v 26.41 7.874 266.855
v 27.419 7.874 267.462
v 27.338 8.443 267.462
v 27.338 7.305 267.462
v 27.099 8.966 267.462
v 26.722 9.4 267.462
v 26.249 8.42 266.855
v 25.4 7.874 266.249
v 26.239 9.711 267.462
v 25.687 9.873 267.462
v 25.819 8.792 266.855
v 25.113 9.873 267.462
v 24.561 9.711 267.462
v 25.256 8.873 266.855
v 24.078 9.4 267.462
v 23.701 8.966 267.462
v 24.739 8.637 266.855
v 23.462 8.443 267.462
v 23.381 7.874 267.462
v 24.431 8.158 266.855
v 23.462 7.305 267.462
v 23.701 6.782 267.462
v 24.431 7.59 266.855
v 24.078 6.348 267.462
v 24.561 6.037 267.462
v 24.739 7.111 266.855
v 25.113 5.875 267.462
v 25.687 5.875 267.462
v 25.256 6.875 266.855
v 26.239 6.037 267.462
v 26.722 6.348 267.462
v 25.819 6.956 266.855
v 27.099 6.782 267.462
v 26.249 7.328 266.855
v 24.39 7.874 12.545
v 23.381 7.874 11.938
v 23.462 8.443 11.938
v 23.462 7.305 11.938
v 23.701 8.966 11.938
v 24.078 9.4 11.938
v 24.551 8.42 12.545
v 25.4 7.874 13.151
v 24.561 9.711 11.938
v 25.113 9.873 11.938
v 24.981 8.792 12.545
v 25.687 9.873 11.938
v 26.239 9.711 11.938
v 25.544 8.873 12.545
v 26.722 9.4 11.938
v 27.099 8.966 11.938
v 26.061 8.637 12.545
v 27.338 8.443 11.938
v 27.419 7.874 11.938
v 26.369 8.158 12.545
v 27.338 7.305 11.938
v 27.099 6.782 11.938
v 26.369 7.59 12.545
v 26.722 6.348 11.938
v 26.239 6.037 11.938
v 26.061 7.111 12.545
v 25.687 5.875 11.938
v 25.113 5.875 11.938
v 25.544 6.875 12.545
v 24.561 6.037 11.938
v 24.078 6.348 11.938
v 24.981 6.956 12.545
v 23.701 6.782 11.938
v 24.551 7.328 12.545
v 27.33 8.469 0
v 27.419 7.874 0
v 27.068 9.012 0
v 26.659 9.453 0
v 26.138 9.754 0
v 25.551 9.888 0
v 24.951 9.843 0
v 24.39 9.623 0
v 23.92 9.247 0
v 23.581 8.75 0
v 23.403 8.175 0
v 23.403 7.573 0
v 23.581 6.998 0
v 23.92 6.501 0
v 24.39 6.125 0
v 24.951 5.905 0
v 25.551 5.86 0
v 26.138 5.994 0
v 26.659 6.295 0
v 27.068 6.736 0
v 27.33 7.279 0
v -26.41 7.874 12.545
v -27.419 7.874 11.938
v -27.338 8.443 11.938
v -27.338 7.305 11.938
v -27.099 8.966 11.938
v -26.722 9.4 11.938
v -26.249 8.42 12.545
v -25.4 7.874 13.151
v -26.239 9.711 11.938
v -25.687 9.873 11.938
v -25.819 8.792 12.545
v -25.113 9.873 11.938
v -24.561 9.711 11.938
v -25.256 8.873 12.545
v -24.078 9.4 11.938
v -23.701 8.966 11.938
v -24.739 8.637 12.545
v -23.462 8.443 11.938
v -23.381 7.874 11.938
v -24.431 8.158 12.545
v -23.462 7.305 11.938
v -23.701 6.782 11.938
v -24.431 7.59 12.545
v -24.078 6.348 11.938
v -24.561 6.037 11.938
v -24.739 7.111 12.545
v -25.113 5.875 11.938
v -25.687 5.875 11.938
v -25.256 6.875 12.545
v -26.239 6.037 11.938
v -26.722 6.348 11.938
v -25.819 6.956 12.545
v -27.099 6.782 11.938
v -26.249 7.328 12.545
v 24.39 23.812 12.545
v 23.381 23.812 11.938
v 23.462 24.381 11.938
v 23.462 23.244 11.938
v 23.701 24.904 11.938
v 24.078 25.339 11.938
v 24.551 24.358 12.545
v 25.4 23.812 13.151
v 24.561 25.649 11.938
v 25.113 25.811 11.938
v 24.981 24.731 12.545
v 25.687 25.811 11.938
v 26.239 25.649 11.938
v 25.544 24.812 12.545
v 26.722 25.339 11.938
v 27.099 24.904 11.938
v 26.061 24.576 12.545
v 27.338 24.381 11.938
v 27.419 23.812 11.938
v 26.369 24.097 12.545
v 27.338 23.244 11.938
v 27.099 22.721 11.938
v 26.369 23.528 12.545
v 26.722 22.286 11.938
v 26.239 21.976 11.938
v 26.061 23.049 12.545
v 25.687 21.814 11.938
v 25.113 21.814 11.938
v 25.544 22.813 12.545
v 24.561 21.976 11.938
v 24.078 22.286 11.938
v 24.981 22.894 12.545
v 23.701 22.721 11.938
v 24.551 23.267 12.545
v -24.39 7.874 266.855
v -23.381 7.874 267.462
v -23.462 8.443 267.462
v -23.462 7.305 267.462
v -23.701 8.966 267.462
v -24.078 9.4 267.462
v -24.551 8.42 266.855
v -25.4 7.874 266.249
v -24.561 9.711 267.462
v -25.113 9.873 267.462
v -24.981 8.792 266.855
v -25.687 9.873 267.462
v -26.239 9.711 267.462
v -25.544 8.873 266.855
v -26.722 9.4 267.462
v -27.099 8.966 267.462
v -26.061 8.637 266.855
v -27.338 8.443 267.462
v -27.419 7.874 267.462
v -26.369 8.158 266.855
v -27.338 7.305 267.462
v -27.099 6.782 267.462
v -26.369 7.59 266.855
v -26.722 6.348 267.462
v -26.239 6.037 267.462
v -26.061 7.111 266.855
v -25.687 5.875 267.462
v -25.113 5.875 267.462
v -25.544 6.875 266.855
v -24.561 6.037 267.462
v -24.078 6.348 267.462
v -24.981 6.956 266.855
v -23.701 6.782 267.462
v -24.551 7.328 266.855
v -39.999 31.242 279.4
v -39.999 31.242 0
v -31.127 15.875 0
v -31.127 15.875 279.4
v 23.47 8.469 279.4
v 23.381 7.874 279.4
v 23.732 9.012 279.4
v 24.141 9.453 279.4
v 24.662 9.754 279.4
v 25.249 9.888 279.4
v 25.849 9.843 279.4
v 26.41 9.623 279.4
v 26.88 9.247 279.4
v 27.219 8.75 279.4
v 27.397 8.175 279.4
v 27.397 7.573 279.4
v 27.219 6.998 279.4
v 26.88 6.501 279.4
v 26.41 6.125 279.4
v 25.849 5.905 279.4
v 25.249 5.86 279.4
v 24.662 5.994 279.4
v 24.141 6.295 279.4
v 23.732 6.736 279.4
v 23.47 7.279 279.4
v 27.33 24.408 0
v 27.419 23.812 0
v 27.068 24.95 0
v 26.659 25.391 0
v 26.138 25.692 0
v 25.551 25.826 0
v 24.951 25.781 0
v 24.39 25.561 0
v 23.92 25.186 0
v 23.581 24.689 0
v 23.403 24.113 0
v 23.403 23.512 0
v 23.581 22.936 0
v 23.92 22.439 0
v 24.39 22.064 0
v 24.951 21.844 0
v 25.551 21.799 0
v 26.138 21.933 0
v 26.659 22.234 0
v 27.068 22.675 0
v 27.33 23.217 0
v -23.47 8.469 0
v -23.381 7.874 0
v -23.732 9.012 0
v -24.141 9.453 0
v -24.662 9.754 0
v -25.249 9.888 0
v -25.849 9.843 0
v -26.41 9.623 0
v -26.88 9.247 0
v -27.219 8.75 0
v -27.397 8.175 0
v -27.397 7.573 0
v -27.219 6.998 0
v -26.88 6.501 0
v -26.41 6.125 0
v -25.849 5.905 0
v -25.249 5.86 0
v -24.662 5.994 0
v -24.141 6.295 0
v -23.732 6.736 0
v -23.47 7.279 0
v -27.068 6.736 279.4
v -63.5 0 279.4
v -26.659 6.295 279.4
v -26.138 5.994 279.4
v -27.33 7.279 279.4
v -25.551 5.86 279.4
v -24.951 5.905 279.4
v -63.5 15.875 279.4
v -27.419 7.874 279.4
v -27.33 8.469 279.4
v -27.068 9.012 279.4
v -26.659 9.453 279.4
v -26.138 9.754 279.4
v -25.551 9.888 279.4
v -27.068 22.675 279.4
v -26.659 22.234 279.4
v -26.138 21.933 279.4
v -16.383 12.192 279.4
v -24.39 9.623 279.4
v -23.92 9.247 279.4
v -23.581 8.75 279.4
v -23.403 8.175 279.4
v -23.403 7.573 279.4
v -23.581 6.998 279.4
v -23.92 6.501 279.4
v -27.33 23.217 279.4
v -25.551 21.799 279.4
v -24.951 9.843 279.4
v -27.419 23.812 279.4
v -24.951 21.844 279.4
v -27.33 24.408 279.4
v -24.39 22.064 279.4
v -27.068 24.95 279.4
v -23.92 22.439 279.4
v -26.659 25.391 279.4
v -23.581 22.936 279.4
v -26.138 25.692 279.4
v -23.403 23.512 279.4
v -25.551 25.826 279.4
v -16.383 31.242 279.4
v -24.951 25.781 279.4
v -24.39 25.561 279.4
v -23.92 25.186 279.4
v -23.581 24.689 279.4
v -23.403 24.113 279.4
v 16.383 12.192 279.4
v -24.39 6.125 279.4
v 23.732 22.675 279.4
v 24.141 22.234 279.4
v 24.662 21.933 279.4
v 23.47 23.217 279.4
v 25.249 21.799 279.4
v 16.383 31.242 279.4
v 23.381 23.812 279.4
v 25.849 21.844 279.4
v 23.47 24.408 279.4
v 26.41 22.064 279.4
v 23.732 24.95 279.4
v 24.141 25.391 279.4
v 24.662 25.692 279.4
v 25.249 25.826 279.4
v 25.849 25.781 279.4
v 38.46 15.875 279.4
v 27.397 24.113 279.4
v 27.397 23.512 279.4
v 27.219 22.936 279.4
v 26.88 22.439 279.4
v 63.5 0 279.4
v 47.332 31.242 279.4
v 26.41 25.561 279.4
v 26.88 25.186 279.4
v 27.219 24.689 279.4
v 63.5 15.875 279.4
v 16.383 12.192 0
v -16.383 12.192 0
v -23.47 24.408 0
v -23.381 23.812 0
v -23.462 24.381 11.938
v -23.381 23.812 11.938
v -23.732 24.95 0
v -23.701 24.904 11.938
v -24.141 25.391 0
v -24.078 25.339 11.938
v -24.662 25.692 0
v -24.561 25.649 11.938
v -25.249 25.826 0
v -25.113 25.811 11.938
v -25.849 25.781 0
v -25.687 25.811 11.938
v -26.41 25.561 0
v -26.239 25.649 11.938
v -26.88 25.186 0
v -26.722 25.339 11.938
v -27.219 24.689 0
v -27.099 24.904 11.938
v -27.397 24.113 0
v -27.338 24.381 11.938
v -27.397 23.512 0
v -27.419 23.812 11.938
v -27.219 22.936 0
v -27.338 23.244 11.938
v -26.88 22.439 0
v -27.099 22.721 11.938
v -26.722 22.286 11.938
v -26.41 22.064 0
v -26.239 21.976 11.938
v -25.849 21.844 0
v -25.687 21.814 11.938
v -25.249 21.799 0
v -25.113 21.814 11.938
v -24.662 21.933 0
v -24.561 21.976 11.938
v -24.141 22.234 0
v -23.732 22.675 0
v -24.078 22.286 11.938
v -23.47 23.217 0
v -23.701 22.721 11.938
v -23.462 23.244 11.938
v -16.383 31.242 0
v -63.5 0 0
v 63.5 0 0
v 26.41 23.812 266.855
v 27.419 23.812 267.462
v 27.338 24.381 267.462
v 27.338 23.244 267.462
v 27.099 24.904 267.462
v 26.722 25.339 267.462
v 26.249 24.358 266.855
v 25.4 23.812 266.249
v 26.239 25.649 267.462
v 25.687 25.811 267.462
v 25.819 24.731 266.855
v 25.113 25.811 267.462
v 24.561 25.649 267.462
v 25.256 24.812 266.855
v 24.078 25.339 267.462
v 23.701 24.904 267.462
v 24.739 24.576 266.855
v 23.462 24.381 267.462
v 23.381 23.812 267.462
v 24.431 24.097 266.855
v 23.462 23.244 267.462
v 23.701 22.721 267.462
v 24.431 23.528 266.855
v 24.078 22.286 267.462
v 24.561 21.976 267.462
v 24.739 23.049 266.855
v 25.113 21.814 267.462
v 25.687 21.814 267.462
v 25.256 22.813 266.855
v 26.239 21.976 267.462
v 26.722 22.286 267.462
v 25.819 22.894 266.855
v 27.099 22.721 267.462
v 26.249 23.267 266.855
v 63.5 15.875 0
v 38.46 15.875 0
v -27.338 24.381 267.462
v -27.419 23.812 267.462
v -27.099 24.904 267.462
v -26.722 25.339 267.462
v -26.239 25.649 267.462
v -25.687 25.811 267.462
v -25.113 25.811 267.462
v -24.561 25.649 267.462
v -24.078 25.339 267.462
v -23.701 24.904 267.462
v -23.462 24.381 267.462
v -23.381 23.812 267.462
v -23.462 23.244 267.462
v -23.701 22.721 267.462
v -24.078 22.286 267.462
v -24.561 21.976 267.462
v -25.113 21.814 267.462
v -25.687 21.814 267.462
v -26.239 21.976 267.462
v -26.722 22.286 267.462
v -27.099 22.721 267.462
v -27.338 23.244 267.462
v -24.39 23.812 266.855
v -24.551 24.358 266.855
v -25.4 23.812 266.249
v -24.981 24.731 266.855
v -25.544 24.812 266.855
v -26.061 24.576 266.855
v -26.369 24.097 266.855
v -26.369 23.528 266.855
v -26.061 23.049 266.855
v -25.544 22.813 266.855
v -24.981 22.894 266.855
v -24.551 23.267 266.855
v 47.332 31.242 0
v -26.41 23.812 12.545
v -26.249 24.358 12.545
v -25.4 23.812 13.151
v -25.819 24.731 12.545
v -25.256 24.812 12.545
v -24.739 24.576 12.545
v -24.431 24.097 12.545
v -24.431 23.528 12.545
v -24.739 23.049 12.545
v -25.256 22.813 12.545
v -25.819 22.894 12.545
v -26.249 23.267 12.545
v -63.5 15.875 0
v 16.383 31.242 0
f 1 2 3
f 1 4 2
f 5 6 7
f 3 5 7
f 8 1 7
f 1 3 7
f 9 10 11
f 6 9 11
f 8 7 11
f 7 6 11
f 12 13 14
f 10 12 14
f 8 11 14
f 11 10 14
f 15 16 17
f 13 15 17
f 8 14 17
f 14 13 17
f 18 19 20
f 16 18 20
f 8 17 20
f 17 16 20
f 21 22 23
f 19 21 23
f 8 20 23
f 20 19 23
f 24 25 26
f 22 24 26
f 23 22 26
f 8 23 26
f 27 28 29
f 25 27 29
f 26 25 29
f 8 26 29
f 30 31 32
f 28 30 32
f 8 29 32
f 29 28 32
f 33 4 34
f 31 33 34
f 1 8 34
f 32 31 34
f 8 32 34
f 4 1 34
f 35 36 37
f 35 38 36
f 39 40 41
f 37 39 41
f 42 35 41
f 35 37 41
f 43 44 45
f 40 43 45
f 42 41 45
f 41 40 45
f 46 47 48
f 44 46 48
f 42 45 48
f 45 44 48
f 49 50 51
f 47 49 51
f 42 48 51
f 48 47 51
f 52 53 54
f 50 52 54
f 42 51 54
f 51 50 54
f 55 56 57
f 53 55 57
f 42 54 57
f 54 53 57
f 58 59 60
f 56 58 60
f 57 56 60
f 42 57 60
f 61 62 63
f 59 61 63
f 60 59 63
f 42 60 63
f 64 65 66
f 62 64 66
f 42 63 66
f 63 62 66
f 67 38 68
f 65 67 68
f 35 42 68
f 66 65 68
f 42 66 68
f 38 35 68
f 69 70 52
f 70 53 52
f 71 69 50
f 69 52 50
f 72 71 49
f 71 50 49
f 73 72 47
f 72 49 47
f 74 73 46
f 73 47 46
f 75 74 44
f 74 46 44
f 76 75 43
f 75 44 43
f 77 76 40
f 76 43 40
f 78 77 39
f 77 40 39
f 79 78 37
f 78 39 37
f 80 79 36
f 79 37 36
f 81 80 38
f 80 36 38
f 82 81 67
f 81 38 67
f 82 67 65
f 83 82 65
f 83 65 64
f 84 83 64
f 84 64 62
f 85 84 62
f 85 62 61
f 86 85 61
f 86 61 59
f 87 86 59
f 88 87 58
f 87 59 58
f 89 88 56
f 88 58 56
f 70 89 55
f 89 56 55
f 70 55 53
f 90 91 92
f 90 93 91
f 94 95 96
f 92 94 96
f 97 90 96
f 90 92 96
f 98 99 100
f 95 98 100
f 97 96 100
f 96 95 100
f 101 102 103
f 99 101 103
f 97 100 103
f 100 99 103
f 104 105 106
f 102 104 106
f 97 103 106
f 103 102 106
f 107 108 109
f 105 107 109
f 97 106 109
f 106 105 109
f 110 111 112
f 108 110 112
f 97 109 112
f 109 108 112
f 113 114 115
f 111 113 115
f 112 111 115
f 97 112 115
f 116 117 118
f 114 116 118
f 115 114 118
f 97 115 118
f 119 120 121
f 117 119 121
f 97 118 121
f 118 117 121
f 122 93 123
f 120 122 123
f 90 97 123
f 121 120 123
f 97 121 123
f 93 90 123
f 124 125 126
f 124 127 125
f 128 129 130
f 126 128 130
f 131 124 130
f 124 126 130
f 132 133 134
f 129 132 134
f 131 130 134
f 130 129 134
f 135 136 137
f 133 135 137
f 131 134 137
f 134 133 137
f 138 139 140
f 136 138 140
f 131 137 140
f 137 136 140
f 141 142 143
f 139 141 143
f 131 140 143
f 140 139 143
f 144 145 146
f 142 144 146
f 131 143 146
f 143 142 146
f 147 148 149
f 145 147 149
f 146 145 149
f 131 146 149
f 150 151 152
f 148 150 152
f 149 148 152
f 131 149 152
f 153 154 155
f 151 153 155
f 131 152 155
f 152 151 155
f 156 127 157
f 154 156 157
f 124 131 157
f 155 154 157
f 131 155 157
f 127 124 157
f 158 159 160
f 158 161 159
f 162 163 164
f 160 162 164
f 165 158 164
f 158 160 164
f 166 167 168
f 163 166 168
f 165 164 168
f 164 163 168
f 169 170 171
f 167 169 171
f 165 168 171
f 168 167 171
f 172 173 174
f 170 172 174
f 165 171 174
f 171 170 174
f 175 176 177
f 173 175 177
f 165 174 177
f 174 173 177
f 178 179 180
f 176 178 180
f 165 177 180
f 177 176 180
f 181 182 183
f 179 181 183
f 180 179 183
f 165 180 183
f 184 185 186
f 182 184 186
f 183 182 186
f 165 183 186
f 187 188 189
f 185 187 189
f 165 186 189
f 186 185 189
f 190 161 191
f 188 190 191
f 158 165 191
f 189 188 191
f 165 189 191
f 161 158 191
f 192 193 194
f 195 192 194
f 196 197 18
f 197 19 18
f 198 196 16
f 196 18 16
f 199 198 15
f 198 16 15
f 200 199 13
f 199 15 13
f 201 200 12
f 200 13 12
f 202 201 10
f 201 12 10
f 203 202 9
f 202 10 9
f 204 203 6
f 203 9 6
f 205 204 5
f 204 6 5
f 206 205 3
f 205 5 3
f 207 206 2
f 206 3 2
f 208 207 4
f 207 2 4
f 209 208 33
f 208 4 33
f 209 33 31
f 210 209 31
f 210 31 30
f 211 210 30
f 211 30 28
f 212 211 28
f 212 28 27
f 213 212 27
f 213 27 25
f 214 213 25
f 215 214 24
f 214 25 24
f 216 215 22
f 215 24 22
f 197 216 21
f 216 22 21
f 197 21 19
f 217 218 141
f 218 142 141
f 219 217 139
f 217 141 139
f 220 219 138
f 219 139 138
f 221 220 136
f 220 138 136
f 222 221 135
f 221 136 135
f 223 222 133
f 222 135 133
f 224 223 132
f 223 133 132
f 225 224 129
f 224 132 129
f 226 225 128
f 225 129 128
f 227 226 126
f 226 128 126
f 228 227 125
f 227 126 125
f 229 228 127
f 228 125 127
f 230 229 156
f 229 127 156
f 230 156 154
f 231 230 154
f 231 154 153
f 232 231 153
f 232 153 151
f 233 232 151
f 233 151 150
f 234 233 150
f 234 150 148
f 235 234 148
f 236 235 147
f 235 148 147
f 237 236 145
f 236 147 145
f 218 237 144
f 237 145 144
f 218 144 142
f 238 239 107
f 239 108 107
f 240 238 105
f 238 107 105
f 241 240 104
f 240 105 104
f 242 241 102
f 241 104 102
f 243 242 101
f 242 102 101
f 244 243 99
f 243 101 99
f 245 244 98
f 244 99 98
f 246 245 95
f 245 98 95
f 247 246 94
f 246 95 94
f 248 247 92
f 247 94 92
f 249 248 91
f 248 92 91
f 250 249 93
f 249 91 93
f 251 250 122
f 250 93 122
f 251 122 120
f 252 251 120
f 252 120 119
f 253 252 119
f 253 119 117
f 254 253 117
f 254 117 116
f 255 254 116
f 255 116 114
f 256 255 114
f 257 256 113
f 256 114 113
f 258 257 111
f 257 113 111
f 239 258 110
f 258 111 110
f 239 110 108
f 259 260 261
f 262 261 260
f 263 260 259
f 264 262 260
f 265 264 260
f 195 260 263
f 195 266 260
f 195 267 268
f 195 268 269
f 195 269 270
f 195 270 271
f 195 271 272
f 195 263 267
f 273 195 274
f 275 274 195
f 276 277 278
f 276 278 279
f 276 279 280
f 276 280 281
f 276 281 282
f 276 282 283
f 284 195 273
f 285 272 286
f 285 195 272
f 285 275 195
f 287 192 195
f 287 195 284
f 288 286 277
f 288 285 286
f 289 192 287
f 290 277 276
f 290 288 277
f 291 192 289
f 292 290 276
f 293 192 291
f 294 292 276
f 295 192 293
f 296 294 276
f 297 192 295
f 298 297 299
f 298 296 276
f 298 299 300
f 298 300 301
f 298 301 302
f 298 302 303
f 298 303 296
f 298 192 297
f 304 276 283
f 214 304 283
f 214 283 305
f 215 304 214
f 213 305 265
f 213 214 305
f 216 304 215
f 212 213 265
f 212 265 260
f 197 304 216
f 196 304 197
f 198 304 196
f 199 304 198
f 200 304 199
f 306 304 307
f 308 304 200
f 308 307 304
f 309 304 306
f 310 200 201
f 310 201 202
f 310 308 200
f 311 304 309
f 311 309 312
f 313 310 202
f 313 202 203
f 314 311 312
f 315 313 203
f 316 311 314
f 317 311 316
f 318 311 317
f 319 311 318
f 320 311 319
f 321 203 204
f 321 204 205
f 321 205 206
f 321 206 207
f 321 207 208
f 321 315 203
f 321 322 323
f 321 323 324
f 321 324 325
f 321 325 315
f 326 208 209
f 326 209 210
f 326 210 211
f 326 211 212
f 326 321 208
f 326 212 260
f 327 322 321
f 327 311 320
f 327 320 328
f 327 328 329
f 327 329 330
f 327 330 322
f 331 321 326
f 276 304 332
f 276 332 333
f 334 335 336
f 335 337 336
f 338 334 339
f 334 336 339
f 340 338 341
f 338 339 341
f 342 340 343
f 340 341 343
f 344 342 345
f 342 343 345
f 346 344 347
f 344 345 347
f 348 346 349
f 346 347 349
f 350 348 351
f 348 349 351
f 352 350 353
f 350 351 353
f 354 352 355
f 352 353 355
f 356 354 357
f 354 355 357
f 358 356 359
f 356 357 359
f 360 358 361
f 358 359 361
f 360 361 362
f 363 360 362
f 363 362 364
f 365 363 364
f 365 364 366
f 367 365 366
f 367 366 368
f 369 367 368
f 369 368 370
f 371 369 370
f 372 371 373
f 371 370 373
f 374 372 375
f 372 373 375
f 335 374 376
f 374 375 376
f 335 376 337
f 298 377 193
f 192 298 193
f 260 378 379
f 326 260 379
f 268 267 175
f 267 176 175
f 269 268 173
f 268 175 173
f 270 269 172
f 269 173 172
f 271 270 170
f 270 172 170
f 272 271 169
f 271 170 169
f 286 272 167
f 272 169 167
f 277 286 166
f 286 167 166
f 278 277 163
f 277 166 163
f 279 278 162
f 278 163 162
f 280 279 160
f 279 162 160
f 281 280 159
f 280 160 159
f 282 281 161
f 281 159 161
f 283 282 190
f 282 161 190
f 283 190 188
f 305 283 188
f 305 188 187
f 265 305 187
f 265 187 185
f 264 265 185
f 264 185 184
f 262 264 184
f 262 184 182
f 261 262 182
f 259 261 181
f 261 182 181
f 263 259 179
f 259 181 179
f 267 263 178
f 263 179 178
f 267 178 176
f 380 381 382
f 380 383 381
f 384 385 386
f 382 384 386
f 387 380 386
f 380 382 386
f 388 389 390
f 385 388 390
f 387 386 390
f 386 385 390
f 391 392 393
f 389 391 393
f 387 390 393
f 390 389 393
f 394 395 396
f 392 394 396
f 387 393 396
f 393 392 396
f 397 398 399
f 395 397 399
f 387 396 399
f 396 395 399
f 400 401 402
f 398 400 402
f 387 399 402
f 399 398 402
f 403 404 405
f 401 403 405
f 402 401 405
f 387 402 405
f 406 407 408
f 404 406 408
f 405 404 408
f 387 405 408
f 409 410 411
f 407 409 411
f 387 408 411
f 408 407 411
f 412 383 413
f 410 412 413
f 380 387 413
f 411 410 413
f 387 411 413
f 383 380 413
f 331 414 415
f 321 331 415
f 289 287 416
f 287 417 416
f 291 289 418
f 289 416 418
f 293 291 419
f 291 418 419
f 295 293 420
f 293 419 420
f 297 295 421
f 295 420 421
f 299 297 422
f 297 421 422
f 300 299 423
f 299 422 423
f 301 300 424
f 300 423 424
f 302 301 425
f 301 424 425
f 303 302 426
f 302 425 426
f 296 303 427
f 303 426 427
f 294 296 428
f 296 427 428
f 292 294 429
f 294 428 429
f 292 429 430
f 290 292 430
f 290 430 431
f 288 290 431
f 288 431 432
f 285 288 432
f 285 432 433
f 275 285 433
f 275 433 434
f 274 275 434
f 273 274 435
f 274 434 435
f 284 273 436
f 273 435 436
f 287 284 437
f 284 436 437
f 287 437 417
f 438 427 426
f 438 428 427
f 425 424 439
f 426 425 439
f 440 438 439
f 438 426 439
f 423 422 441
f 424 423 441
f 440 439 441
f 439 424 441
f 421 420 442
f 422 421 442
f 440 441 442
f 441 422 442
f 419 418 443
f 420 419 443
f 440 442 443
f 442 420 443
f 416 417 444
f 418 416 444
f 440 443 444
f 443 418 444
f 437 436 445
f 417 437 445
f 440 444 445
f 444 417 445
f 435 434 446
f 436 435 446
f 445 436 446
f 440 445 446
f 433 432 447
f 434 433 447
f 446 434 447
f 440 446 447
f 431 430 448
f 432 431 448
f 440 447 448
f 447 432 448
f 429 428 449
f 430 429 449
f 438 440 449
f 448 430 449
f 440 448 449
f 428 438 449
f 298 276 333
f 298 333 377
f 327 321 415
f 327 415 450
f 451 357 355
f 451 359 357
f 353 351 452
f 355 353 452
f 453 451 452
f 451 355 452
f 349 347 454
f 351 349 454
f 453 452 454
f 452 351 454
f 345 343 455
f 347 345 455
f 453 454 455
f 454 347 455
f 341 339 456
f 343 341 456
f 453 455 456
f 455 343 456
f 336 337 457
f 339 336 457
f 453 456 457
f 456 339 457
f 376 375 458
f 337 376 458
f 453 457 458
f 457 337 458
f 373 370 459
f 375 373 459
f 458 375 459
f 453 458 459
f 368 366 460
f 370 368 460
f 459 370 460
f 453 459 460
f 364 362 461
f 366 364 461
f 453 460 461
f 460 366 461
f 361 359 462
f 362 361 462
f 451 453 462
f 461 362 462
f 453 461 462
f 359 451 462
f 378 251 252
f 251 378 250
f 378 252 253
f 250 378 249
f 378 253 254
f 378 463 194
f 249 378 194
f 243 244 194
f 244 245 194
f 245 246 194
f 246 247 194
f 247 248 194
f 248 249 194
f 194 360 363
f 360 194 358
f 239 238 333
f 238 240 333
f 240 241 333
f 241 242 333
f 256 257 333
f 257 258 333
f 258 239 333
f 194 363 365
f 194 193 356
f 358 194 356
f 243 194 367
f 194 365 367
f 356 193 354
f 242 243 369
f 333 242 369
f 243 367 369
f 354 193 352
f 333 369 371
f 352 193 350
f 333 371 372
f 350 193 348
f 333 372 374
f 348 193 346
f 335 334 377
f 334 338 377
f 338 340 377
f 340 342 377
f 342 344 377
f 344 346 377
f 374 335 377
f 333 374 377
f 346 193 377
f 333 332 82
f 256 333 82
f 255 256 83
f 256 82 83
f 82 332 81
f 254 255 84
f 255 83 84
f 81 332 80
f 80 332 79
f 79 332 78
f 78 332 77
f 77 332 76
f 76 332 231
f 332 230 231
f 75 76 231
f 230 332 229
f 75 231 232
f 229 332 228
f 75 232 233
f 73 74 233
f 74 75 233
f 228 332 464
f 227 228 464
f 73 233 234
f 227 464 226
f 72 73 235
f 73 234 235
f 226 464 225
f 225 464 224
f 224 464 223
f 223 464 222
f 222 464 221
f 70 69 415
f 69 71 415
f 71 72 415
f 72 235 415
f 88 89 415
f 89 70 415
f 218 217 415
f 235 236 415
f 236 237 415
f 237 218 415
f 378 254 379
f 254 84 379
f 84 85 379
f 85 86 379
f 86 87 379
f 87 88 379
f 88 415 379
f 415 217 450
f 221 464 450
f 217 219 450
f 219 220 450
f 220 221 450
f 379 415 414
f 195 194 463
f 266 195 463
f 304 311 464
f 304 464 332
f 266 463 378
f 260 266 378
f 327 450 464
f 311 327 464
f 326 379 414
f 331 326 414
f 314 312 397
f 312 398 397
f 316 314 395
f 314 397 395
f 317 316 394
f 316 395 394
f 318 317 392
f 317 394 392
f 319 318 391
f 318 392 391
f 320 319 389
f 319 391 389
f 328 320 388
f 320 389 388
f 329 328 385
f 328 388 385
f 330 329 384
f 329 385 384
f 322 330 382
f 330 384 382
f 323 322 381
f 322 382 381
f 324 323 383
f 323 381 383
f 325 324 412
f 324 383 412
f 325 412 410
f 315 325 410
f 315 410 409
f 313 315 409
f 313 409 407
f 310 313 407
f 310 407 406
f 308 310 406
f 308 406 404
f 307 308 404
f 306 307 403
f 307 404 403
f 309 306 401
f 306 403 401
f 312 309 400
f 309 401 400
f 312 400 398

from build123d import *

# Parameters (mm, degrees)
X_GUIDE_EXTRUDE_DEPTH   = 279.4
END_PLATE_HOLES_D       = 4.0386
END_PLATE_HOLES_DEPTH   = 11.938
END_PLATE_HOLES_TIP     = 1.213317848
END_PLATE_HOLES_2_D     = 4.0386
END_PLATE_HOLES_2_DEPTH = 11.938
END_PLATE_HOLES_2_TIP   = 1.213317848


with BuildPart() as part:
    # dovetail-male-profile → x-guide-extrude (new body)
    with BuildSketch(Plane.XY):
        Polygon((47.331706063, 31.242), (16.383, 31.242), (16.383, 12.192), (-16.383, 12.192), (-16.383, 31.242), (-39.999357645, 31.242), (-31.127216058, 15.875), (-63.5, 15.875), (-63.5, 0), (63.5, 0), (63.5, 15.875), (38.459564477, 15.875), align=None)
    extrude(amount=X_GUIDE_EXTRUDE_DEPTH)

    # end plate holes
    with Locations(Plane(origin=(0, 0, 0), x_dir=(-1, 0, 0), z_dir=(0, 0, -1))):
        with Locations((-25.4, 23.8125), (25.4, 23.8125), (25.4, 7.874), (-25.4, 7.874)):
            Hole(END_PLATE_HOLES_D / 2, depth=END_PLATE_HOLES_DEPTH)
            with Locations((0, 0, -(END_PLATE_HOLES_DEPTH + END_PLATE_HOLES_TIP / 2))):  # 118° drill point
                Cone(0, END_PLATE_HOLES_D / 2, END_PLATE_HOLES_TIP, mode=Mode.SUBTRACT)

    # end plate holes 2
    with Locations(Plane.XY.offset(279.4)):
        with Locations((25.4, 23.8125), (25.4, 7.874), (-25.4, 7.874), (-25.4, 23.8125)):
            Hole(END_PLATE_HOLES_2_D / 2, depth=END_PLATE_HOLES_2_DEPTH)
            with Locations((0, 0, -(END_PLATE_HOLES_2_DEPTH + END_PLATE_HOLES_2_TIP / 2))):  # 118° drill point
                Cone(0, END_PLATE_HOLES_2_D / 2, END_PLATE_HOLES_2_TIP, mode=Mode.SUBTRACT)


solid = part.part
